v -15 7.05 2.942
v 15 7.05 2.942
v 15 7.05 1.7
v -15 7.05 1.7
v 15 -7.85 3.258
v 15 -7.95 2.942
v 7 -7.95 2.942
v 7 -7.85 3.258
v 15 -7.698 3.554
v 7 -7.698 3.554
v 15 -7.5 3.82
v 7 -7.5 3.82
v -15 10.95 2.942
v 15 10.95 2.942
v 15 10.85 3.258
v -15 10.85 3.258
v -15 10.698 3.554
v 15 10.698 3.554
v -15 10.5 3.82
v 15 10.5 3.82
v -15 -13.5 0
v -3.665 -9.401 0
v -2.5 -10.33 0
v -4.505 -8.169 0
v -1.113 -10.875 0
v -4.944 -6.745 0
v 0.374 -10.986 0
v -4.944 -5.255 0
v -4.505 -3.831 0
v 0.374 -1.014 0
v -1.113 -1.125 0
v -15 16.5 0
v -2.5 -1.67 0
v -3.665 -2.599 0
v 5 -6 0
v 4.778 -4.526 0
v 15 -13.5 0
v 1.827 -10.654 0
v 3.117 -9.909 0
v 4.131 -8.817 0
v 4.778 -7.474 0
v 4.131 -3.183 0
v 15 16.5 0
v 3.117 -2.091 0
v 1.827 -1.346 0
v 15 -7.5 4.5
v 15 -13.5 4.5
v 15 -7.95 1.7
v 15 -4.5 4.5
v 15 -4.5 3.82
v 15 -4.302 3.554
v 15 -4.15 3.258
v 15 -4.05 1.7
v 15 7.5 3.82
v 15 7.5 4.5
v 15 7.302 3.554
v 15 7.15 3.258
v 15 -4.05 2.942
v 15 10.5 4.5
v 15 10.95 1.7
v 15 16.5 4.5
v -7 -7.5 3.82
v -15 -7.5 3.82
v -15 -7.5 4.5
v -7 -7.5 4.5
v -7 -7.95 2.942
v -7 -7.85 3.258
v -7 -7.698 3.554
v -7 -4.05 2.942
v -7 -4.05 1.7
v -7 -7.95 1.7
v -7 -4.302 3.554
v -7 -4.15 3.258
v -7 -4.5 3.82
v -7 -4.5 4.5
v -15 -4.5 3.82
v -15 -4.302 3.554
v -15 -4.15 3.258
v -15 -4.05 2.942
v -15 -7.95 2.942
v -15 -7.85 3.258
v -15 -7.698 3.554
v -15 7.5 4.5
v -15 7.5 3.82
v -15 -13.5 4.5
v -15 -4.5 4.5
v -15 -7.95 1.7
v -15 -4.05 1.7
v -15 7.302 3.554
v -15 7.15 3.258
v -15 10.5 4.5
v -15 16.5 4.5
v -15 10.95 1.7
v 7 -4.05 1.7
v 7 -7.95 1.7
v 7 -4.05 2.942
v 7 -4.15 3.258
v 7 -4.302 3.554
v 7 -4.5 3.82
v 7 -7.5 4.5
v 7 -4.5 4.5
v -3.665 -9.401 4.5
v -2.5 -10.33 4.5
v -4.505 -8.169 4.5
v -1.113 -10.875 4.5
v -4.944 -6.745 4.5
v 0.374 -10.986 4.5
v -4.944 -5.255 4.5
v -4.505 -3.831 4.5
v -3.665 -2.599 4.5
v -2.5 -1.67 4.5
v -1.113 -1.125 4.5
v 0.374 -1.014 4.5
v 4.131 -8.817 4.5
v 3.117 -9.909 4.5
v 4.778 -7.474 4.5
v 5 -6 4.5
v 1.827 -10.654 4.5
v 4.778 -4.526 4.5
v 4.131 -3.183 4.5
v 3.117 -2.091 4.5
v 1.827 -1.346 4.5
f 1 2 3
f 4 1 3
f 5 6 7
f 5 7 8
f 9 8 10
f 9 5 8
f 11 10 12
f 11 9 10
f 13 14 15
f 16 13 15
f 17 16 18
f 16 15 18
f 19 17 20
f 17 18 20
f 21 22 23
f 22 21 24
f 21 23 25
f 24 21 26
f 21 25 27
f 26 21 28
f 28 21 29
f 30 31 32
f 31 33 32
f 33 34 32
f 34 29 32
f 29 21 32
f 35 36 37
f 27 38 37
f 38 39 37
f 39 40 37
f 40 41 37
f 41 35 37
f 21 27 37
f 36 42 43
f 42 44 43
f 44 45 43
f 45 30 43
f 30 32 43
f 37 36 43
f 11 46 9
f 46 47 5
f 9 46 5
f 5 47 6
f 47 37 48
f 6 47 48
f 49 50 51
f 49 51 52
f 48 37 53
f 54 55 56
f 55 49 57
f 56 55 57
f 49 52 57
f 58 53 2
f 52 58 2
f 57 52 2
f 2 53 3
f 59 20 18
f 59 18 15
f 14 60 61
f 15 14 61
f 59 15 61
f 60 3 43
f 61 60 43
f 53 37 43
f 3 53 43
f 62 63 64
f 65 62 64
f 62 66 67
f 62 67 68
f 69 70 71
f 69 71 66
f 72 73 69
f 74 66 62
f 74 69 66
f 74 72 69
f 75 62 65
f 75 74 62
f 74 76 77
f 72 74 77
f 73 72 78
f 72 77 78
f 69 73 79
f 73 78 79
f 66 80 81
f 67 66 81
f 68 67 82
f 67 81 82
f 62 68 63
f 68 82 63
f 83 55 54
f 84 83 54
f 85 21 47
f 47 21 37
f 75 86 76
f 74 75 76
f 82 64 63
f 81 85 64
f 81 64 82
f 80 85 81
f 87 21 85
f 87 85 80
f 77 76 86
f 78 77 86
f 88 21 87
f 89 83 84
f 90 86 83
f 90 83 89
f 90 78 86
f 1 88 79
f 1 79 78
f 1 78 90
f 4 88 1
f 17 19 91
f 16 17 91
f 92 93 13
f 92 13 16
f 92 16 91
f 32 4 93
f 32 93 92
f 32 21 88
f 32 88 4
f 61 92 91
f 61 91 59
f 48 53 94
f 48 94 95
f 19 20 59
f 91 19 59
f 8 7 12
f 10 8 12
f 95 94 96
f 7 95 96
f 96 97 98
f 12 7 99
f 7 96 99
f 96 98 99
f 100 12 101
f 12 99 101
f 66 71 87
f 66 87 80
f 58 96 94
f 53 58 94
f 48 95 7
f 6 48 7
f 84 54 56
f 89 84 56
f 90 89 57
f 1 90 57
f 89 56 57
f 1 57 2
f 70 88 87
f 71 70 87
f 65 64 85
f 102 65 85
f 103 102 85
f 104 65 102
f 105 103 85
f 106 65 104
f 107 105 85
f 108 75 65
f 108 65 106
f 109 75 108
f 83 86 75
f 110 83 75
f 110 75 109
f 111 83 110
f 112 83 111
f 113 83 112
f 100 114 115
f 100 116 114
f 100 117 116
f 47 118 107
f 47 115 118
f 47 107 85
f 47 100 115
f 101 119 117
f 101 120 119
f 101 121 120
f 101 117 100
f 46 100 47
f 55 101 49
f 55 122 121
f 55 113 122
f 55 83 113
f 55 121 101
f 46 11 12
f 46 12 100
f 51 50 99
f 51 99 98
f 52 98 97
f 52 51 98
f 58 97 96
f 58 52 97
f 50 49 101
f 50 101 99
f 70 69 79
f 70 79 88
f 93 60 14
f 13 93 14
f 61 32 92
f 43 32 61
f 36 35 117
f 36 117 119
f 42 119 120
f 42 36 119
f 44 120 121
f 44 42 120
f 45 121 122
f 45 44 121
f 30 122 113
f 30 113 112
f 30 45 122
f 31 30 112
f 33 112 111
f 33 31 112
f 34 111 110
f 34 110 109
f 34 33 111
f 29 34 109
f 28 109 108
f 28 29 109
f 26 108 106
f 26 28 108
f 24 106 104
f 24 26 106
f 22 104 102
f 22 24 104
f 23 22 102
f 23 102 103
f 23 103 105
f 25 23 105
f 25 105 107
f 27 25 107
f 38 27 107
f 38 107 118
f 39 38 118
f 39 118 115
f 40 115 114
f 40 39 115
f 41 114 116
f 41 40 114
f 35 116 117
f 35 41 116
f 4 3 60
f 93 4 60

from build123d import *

# Parameters (mm, degrees)
SKETCH_2_W          = 30
SKETCH_2_H          = 30
SKETCH_2_R          = 5
EXTRUDE_1_DEPTH     = 4.5
CUT_EXTRUDE_1_DEPTH = 35.5325933
CUT_EXTRUDE_2_DEPTH = 8


with BuildPart() as part:
    # 草图2 → 凸台-拉伸1 (new body)
    with BuildSketch(Plane.XY):
        with Locations((0, 1.5)):
            Rectangle(SKETCH_2_W, SKETCH_2_H)
        with Locations((0, -6)):
            Circle(SKETCH_2_R, mode=Mode.SUBTRACT)
    extrude(amount=EXTRUDE_1_DEPTH)

    # 草图4 → 切除-拉伸1 (cut, through all)
    with BuildSketch(Plane(origin=(15, 0, 0), x_dir=(0, 0, -1), z_dir=(1, 0, 0))):
        with BuildLine():
            Line((-4.5, 7.5), (-3.82, 7.5))
            ThreePointArc((-3.82, 7.5), (-3.408962817, 7.219957697), (-2.941534065, 7.05))
            Line((-2.941534065, 7.05), (-1.7, 7.05))
            Line((-1.7, 7.05), (-1.7, 10.95))
            Line((-1.7, 10.95), (-2.941534065, 10.95))
            ThreePointArc((-2.941534065, 10.95), (-3.408962817, 10.780042303), (-3.82, 10.5))
            Line((-3.82, 10.5), (-4.5, 10.5))
            Line((-4.5, 10.5), (-4.5, 7.5))
        make_face()
    extrude(amount=-CUT_EXTRUDE_1_DEPTH, mode=Mode.SUBTRACT)

    # 草图5 → 切除-拉伸2 (cut)
    with BuildSketch(Plane(origin=(15, 0, 0), x_dir=(0, 0, -1), z_dir=(1, 0, 0))):
        with BuildLine():
            Line((-1.7, -4.05), (-1.7, -7.95))
            Line((-1.7, -7.95), (-2.941534065, -7.95))
            ThreePointArc((-2.941534065, -7.95), (-3.408962817, -7.780042303), (-3.82, -7.5))
            Line((-3.82, -7.5), (-4.5, -7.5))
            Line((-4.5, -7.5), (-4.5, -4.5))
            Line((-4.5, -4.5), (-3.82, -4.5))
            ThreePointArc((-3.82, -4.5), (-3.408962817, -4.219957697), (-2.941534065, -4.05))
            Line((-2.941534065, -4.05), (-1.7, -4.05))
        make_face()
    cut_extrude_2 = extrude(amount=-CUT_EXTRUDE_2_DEPTH, mode=Mode.SUBTRACT)

    # 镜向1: 切除-拉伸2 across plane
    add(cut_extrude_2.mirror(Plane(origin=(0, 0, 0), x_dir=(0, 0, 1), z_dir=(1, 0, 0))), mode=Mode.SUBTRACT)


solid = part.part
